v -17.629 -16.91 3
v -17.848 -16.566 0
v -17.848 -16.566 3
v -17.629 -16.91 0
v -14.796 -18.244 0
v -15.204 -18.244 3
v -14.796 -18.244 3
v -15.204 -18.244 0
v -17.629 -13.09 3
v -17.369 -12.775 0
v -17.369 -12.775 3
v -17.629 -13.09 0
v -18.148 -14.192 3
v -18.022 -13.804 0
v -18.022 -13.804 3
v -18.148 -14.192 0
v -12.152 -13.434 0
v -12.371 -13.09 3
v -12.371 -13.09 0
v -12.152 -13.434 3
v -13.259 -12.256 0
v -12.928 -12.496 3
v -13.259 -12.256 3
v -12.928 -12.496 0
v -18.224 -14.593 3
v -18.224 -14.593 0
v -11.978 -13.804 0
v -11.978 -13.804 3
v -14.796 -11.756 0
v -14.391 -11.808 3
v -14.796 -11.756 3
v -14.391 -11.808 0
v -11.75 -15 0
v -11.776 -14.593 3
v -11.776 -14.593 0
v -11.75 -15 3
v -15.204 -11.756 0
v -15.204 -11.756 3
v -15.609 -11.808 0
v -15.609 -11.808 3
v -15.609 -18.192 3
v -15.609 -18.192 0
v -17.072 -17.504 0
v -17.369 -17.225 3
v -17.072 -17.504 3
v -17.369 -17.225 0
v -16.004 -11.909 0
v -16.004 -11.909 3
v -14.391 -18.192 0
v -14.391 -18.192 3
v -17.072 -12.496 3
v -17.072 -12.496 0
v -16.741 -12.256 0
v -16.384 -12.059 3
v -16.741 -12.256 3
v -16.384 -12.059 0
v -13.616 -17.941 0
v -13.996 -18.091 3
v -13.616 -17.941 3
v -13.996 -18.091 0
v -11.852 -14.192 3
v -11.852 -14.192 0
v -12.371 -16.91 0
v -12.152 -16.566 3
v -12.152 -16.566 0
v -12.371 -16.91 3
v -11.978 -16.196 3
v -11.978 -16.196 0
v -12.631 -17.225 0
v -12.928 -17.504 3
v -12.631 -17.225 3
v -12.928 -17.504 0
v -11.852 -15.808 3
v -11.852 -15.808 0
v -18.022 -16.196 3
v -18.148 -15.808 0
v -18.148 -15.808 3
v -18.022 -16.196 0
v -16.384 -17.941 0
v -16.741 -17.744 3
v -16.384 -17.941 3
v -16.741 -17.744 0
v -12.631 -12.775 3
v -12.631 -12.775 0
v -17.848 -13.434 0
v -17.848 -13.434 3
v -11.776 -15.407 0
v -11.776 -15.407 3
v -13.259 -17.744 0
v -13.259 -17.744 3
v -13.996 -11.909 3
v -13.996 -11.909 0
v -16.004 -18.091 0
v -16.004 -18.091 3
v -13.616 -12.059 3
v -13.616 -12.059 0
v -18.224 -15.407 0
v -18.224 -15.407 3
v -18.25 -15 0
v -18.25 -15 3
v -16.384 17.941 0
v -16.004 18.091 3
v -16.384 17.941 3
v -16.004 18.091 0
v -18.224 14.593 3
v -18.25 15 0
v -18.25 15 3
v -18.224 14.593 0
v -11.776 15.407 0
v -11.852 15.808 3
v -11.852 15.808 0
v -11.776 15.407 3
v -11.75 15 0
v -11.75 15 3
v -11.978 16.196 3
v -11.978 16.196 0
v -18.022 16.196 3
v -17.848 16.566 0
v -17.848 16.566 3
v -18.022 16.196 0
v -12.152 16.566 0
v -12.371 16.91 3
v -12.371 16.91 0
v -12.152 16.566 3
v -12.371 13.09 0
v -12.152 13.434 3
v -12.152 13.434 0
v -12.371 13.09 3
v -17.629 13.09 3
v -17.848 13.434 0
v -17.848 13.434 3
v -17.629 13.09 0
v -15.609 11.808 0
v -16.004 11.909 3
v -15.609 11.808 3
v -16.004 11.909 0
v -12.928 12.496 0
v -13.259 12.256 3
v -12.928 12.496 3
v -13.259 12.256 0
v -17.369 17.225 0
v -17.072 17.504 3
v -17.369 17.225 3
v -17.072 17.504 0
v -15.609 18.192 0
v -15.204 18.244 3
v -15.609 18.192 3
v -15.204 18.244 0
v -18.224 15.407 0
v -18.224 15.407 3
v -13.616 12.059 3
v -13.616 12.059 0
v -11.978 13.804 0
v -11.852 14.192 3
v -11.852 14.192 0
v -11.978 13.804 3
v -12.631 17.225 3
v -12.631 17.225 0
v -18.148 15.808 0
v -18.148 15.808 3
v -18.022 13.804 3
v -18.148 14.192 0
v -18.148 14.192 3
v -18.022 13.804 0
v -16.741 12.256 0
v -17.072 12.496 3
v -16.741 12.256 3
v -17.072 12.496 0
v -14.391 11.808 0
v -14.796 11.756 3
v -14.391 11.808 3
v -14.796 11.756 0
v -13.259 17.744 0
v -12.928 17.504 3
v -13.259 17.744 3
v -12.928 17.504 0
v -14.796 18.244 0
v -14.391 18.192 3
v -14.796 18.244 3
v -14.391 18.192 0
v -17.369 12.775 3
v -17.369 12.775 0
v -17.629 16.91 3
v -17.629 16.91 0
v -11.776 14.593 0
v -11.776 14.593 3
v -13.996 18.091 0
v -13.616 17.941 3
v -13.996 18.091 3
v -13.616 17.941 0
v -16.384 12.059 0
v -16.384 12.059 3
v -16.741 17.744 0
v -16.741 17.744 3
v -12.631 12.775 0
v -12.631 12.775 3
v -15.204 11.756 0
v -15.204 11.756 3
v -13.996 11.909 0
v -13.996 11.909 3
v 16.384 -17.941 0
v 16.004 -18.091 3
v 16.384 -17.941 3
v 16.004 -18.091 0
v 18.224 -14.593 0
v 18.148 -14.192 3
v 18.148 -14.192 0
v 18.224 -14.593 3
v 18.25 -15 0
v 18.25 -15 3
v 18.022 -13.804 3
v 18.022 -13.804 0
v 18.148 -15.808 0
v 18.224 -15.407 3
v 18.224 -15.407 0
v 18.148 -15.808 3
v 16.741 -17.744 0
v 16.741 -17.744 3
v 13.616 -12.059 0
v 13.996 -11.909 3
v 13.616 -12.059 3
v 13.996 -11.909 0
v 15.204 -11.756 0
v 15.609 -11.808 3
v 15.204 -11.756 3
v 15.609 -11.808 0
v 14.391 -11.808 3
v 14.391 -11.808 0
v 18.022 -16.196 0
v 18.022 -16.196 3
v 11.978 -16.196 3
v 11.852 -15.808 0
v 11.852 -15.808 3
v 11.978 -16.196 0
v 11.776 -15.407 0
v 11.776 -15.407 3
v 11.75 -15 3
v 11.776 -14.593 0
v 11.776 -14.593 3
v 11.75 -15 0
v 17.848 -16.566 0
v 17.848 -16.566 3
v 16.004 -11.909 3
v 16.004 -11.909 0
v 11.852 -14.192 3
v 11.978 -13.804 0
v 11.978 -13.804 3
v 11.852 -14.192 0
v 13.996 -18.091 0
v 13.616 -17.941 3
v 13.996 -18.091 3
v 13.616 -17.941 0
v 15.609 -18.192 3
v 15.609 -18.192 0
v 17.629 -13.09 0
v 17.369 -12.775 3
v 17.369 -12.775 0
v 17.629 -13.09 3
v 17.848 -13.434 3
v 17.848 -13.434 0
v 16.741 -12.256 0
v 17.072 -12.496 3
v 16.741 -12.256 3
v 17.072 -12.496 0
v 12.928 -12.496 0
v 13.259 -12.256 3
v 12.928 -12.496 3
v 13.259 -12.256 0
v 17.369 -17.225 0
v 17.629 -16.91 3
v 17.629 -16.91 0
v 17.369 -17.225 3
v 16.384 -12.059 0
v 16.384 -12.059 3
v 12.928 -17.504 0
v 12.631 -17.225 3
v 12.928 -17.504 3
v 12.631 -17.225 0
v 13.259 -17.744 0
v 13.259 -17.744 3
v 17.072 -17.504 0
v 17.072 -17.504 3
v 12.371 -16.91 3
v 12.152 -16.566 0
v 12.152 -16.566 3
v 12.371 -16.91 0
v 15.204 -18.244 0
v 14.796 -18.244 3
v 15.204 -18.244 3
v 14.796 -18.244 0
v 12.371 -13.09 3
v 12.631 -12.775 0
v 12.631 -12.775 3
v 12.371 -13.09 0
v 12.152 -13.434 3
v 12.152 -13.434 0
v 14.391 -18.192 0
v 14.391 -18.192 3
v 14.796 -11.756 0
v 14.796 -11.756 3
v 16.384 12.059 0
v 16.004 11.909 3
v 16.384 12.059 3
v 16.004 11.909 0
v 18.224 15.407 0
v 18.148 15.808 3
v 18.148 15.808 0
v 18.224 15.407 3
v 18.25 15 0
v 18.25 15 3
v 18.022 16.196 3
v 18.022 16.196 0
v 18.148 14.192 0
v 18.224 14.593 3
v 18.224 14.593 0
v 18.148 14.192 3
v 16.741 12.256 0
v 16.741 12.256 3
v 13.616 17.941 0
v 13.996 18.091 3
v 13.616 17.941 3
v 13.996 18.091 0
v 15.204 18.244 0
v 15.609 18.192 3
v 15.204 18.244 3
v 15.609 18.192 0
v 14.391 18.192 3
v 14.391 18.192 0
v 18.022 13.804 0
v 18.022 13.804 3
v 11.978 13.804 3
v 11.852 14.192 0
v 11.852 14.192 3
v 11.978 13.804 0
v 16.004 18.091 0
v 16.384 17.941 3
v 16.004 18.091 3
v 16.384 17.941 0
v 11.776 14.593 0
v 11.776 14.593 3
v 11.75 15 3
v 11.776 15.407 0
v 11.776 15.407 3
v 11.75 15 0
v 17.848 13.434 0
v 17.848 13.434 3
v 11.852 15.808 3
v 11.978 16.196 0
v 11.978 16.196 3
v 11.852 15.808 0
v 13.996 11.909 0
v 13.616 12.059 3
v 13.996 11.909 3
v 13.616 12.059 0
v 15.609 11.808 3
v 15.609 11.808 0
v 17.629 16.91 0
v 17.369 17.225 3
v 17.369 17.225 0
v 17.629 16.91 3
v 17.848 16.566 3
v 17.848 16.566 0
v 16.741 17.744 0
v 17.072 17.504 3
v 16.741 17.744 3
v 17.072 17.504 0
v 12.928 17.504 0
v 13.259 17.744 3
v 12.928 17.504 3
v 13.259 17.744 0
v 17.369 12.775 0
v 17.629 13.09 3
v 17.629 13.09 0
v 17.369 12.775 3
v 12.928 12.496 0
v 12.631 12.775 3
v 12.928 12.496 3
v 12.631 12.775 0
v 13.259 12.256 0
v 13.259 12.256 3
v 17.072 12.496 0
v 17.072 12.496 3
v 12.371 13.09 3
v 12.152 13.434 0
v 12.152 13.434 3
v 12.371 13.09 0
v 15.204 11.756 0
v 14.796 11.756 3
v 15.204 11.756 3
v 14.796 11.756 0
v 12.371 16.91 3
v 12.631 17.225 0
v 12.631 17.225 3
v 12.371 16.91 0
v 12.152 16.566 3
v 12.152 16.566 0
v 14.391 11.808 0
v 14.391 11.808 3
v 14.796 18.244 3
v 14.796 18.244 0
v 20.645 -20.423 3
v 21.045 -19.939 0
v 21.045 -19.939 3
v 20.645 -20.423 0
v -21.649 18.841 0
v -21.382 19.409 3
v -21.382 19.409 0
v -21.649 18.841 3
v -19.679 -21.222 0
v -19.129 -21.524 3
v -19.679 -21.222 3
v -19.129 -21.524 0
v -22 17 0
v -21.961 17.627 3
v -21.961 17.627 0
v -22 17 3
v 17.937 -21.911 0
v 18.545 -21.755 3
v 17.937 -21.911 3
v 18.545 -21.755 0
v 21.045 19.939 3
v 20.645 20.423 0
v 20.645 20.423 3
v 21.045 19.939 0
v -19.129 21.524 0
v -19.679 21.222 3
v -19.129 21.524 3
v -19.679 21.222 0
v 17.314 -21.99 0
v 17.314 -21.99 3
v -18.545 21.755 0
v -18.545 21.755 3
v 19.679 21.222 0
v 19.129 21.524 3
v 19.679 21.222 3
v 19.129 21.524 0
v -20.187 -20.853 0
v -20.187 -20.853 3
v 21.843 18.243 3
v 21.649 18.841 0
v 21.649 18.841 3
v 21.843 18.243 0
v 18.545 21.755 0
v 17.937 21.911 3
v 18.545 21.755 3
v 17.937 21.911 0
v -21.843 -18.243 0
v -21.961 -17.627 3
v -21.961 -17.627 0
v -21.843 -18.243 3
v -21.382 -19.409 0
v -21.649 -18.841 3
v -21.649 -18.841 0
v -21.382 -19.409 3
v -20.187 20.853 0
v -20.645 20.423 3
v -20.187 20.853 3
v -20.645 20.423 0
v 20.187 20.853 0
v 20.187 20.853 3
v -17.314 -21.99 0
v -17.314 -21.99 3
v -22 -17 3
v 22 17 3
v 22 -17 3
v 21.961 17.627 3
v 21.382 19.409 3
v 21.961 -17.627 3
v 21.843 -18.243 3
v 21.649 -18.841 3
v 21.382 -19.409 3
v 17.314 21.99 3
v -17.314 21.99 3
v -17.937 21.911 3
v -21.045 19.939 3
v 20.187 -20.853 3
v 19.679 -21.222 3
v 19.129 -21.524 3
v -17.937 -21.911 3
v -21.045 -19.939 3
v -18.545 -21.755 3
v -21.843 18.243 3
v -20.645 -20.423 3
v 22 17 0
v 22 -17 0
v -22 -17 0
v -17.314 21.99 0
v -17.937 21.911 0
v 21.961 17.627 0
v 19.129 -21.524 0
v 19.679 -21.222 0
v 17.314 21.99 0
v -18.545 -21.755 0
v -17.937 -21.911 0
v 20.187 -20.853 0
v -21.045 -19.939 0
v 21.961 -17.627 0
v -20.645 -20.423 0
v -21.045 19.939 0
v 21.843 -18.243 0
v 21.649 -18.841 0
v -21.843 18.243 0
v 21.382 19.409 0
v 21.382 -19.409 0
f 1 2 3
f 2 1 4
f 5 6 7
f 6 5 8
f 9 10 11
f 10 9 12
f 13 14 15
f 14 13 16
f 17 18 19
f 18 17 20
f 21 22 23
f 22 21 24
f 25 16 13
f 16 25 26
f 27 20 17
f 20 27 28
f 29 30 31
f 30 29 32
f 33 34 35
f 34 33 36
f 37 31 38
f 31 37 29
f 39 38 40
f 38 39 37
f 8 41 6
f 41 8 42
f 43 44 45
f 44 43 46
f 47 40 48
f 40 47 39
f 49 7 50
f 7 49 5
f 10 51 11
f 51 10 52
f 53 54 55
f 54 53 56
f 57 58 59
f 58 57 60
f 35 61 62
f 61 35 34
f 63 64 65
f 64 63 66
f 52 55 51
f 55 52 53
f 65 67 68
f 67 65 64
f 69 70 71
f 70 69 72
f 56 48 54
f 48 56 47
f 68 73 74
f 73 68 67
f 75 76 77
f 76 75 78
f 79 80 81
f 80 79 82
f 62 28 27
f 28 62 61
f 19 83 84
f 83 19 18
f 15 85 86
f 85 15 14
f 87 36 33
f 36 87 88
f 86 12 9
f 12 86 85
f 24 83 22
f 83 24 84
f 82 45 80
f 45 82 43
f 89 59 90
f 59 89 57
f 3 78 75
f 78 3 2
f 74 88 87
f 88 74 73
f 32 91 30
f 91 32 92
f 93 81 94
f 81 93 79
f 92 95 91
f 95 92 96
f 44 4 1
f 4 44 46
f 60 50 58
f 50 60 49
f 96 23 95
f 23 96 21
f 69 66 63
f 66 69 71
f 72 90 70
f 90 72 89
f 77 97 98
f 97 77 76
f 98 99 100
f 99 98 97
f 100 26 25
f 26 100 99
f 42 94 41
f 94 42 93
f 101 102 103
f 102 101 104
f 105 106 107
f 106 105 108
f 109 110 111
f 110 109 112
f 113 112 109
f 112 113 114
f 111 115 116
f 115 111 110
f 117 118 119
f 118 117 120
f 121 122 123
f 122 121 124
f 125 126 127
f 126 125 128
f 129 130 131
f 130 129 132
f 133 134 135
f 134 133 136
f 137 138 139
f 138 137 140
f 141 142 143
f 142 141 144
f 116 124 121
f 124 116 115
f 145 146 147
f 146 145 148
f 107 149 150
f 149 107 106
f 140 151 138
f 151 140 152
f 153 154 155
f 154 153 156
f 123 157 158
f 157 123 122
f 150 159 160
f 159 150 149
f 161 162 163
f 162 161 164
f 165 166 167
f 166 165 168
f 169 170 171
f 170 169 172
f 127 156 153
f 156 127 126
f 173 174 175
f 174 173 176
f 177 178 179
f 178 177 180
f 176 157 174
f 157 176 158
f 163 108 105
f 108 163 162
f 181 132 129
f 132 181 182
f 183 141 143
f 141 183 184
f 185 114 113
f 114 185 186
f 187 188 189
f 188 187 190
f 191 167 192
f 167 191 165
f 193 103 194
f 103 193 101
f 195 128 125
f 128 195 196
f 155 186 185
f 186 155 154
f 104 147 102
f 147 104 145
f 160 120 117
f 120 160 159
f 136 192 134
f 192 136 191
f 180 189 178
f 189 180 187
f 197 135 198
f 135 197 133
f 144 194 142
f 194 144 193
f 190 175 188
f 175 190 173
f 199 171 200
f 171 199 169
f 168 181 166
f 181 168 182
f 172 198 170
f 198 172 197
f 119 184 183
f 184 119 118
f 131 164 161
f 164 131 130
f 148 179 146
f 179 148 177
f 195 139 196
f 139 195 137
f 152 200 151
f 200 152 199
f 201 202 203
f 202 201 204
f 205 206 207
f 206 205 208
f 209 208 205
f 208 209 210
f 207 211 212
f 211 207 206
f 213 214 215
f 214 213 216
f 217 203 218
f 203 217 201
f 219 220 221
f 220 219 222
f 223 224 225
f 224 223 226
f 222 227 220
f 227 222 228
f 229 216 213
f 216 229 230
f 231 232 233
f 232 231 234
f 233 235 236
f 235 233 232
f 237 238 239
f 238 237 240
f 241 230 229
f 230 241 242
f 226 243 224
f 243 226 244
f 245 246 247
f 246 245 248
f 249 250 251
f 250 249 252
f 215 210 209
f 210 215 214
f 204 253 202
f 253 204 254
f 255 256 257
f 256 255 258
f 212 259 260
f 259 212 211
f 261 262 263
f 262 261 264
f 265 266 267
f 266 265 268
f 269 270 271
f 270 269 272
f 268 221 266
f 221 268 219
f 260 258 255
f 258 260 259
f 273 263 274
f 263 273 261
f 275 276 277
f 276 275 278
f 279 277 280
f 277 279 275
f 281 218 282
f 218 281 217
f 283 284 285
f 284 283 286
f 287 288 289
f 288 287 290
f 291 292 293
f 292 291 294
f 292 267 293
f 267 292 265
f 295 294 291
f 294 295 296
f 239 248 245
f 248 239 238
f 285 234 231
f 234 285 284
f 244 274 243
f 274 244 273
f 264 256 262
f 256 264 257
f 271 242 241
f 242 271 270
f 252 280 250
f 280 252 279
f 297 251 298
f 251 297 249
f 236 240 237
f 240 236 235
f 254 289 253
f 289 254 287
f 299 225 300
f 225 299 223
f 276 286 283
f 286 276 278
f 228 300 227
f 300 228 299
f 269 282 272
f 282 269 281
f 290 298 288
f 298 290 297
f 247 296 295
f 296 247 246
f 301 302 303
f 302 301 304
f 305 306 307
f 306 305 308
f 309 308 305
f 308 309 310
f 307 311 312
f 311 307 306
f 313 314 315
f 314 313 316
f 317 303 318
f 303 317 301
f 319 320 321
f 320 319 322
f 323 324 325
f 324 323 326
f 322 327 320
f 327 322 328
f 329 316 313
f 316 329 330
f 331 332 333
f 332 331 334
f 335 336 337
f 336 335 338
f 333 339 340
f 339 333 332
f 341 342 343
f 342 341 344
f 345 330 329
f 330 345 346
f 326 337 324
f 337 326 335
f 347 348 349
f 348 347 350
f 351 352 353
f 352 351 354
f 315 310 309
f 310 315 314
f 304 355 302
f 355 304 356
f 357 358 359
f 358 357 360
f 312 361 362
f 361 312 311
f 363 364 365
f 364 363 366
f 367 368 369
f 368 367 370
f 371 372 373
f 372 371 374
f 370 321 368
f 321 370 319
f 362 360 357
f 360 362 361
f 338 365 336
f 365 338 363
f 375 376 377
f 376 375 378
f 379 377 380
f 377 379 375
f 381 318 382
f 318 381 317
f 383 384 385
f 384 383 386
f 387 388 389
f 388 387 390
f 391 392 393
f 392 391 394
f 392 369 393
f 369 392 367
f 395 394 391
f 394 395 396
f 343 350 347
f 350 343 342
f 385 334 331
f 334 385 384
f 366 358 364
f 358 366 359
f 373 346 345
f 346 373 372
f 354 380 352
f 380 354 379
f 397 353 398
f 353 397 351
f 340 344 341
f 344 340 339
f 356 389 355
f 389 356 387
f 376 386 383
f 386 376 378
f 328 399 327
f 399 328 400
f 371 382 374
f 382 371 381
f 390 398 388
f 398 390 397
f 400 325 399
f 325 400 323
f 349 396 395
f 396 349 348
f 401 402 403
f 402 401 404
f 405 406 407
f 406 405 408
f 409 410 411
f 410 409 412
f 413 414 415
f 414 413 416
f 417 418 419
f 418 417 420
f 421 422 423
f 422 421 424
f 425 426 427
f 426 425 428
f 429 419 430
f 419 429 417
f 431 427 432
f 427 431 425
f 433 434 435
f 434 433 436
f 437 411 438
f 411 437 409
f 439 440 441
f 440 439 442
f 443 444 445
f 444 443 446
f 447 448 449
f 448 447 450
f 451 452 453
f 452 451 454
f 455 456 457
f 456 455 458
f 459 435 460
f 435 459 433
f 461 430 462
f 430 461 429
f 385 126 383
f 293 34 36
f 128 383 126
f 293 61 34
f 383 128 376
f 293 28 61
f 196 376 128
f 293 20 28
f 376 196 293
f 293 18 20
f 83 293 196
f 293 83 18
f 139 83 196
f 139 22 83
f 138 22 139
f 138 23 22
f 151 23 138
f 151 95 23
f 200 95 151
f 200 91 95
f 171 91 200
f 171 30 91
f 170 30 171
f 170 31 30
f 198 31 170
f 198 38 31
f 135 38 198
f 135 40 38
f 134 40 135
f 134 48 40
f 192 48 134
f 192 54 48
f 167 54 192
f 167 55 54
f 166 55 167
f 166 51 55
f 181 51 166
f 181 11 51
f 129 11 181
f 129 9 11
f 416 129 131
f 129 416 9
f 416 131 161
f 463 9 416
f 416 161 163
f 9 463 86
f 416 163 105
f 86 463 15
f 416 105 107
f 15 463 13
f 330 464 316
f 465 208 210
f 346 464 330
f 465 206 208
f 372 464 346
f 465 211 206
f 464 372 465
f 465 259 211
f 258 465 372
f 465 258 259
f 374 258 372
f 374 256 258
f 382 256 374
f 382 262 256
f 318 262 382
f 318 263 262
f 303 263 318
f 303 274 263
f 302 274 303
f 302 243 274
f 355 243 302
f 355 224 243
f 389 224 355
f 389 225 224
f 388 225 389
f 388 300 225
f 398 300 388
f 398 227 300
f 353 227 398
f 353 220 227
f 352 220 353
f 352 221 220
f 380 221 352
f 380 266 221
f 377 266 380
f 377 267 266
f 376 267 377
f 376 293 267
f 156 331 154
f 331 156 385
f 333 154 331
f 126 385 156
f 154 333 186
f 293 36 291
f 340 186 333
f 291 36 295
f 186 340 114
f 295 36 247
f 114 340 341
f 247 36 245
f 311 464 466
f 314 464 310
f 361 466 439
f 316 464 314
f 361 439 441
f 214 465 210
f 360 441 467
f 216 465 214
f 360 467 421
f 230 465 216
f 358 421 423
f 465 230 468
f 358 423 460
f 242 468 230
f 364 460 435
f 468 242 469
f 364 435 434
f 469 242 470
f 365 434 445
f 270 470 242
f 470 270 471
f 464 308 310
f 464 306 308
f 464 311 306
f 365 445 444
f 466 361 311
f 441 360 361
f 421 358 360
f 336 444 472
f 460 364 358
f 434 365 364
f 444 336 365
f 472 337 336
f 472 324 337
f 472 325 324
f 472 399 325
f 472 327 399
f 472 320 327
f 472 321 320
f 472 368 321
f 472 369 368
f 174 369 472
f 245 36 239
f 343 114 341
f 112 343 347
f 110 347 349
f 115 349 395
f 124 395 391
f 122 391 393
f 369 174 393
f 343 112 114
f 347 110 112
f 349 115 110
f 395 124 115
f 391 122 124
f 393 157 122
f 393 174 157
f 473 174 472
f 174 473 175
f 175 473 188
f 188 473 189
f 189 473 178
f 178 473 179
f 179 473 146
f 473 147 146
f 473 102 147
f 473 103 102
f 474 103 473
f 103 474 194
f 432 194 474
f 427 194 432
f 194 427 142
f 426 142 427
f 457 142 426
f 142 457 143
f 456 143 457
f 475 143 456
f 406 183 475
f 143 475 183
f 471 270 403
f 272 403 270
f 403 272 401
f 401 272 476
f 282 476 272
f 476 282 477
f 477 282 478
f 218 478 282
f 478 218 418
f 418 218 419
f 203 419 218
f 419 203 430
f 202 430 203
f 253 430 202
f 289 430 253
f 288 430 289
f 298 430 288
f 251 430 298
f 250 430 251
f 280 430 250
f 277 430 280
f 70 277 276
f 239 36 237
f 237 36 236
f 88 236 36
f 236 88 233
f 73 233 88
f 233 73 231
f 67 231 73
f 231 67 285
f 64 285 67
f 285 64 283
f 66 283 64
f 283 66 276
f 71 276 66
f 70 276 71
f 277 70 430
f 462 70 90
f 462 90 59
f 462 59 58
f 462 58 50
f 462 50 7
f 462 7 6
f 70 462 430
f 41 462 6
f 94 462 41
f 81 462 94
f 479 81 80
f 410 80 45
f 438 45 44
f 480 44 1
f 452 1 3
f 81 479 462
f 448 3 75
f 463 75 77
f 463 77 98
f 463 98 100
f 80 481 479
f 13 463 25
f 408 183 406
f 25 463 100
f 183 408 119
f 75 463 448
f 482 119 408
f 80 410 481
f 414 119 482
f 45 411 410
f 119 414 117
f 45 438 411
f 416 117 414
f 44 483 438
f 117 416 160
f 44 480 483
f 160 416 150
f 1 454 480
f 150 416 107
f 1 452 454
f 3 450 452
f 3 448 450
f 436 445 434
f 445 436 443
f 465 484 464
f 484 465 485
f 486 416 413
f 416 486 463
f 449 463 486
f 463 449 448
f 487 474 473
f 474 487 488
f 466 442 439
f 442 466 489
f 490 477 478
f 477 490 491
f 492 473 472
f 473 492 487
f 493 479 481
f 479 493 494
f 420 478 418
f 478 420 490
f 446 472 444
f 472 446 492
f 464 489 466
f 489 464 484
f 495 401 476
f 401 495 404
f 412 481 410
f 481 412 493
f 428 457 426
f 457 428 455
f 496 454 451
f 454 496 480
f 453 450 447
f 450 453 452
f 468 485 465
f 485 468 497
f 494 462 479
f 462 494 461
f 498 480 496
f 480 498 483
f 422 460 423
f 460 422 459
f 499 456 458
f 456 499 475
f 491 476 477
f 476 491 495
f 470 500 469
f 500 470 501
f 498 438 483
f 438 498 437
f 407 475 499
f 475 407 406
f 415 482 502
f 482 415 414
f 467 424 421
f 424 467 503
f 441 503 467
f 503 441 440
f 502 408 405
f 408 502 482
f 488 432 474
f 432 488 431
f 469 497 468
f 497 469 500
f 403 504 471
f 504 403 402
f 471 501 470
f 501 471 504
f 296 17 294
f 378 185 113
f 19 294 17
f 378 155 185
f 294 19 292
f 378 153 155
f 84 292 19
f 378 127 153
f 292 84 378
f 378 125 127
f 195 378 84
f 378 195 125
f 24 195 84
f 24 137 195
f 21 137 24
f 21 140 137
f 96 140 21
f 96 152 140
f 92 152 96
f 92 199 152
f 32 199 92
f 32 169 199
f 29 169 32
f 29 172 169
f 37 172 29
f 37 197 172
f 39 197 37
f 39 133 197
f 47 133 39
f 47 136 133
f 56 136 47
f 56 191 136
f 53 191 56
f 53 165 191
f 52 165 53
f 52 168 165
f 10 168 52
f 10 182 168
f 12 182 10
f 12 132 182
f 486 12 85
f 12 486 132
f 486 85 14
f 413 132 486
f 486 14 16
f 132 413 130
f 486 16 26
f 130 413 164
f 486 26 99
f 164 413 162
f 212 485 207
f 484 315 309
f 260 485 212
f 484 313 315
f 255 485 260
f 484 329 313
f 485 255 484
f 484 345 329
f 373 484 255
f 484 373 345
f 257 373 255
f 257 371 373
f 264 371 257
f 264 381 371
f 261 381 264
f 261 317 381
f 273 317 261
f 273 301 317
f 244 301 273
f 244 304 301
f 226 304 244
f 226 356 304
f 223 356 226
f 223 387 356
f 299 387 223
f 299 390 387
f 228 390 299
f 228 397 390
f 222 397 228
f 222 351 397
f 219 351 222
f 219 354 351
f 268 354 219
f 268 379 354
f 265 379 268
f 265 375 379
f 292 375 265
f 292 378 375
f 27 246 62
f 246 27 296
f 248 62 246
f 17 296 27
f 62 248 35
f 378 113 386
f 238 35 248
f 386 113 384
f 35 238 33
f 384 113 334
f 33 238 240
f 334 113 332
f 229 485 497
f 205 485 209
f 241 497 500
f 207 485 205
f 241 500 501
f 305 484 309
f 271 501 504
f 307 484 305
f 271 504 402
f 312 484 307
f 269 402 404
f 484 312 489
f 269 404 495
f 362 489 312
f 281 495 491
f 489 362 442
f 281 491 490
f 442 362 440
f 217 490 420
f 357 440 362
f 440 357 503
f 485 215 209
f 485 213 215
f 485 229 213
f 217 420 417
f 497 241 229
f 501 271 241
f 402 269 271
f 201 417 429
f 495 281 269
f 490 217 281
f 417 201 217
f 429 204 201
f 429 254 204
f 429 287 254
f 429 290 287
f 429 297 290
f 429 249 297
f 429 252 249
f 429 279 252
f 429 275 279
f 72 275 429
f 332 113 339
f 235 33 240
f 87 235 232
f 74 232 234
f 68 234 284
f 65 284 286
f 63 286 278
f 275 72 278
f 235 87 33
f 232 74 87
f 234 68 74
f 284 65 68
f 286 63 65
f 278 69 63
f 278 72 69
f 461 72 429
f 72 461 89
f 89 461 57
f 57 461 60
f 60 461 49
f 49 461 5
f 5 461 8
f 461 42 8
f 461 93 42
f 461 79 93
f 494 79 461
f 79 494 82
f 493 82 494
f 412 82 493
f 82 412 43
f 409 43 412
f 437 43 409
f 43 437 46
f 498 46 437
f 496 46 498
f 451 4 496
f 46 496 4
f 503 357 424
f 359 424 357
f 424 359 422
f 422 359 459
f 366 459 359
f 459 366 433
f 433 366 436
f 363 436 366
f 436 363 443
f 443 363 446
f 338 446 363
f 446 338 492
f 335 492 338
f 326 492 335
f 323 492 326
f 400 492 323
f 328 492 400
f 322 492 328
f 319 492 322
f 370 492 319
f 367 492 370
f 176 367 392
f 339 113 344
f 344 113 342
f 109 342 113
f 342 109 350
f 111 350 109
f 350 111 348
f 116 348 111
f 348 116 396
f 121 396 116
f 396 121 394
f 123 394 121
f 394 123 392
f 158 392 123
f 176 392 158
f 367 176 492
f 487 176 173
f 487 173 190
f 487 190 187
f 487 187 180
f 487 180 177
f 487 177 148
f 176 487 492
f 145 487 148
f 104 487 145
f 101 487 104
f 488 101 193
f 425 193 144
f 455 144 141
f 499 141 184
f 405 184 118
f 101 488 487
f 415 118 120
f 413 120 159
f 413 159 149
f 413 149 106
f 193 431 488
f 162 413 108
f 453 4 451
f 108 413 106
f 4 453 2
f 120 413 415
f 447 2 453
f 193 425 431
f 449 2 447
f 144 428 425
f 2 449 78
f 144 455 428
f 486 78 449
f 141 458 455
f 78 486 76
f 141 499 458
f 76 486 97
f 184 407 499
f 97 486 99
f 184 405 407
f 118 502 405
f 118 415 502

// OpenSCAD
$fn = 50;


difference() {
	union() {
		hull() {
			translate(v = [-17.0000000000, 17.0000000000, 0]) {
				cylinder(h = 3, r = 5);
			}
			translate(v = [17.0000000000, 17.0000000000, 0]) {
				cylinder(h = 3, r = 5);
			}
			translate(v = [-17.0000000000, -17.0000000000, 0]) {
				cylinder(h = 3, r = 5);
			}
			translate(v = [17.0000000000, -17.0000000000, 0]) {
				cylinder(h = 3, r = 5);
			}
		}
	}
	union() {
		translate(v = [-15.0000000000, -15.0000000000, -100.0000000000]) {
			cylinder(h = 200, r = 3.2500000000);
		}
		translate(v = [-15.0000000000, 15.0000000000, -100.0000000000]) {
			cylinder(h = 200, r = 3.2500000000);
		}
		translate(v = [15.0000000000, -15.0000000000, -100.0000000000]) {
			cylinder(h = 200, r = 3.2500000000);
		}
		translate(v = [15.0000000000, 15.0000000000, -100.0000000000]) {
			cylinder(h = 200, r = 3.2500000000);
		}
	}
}
